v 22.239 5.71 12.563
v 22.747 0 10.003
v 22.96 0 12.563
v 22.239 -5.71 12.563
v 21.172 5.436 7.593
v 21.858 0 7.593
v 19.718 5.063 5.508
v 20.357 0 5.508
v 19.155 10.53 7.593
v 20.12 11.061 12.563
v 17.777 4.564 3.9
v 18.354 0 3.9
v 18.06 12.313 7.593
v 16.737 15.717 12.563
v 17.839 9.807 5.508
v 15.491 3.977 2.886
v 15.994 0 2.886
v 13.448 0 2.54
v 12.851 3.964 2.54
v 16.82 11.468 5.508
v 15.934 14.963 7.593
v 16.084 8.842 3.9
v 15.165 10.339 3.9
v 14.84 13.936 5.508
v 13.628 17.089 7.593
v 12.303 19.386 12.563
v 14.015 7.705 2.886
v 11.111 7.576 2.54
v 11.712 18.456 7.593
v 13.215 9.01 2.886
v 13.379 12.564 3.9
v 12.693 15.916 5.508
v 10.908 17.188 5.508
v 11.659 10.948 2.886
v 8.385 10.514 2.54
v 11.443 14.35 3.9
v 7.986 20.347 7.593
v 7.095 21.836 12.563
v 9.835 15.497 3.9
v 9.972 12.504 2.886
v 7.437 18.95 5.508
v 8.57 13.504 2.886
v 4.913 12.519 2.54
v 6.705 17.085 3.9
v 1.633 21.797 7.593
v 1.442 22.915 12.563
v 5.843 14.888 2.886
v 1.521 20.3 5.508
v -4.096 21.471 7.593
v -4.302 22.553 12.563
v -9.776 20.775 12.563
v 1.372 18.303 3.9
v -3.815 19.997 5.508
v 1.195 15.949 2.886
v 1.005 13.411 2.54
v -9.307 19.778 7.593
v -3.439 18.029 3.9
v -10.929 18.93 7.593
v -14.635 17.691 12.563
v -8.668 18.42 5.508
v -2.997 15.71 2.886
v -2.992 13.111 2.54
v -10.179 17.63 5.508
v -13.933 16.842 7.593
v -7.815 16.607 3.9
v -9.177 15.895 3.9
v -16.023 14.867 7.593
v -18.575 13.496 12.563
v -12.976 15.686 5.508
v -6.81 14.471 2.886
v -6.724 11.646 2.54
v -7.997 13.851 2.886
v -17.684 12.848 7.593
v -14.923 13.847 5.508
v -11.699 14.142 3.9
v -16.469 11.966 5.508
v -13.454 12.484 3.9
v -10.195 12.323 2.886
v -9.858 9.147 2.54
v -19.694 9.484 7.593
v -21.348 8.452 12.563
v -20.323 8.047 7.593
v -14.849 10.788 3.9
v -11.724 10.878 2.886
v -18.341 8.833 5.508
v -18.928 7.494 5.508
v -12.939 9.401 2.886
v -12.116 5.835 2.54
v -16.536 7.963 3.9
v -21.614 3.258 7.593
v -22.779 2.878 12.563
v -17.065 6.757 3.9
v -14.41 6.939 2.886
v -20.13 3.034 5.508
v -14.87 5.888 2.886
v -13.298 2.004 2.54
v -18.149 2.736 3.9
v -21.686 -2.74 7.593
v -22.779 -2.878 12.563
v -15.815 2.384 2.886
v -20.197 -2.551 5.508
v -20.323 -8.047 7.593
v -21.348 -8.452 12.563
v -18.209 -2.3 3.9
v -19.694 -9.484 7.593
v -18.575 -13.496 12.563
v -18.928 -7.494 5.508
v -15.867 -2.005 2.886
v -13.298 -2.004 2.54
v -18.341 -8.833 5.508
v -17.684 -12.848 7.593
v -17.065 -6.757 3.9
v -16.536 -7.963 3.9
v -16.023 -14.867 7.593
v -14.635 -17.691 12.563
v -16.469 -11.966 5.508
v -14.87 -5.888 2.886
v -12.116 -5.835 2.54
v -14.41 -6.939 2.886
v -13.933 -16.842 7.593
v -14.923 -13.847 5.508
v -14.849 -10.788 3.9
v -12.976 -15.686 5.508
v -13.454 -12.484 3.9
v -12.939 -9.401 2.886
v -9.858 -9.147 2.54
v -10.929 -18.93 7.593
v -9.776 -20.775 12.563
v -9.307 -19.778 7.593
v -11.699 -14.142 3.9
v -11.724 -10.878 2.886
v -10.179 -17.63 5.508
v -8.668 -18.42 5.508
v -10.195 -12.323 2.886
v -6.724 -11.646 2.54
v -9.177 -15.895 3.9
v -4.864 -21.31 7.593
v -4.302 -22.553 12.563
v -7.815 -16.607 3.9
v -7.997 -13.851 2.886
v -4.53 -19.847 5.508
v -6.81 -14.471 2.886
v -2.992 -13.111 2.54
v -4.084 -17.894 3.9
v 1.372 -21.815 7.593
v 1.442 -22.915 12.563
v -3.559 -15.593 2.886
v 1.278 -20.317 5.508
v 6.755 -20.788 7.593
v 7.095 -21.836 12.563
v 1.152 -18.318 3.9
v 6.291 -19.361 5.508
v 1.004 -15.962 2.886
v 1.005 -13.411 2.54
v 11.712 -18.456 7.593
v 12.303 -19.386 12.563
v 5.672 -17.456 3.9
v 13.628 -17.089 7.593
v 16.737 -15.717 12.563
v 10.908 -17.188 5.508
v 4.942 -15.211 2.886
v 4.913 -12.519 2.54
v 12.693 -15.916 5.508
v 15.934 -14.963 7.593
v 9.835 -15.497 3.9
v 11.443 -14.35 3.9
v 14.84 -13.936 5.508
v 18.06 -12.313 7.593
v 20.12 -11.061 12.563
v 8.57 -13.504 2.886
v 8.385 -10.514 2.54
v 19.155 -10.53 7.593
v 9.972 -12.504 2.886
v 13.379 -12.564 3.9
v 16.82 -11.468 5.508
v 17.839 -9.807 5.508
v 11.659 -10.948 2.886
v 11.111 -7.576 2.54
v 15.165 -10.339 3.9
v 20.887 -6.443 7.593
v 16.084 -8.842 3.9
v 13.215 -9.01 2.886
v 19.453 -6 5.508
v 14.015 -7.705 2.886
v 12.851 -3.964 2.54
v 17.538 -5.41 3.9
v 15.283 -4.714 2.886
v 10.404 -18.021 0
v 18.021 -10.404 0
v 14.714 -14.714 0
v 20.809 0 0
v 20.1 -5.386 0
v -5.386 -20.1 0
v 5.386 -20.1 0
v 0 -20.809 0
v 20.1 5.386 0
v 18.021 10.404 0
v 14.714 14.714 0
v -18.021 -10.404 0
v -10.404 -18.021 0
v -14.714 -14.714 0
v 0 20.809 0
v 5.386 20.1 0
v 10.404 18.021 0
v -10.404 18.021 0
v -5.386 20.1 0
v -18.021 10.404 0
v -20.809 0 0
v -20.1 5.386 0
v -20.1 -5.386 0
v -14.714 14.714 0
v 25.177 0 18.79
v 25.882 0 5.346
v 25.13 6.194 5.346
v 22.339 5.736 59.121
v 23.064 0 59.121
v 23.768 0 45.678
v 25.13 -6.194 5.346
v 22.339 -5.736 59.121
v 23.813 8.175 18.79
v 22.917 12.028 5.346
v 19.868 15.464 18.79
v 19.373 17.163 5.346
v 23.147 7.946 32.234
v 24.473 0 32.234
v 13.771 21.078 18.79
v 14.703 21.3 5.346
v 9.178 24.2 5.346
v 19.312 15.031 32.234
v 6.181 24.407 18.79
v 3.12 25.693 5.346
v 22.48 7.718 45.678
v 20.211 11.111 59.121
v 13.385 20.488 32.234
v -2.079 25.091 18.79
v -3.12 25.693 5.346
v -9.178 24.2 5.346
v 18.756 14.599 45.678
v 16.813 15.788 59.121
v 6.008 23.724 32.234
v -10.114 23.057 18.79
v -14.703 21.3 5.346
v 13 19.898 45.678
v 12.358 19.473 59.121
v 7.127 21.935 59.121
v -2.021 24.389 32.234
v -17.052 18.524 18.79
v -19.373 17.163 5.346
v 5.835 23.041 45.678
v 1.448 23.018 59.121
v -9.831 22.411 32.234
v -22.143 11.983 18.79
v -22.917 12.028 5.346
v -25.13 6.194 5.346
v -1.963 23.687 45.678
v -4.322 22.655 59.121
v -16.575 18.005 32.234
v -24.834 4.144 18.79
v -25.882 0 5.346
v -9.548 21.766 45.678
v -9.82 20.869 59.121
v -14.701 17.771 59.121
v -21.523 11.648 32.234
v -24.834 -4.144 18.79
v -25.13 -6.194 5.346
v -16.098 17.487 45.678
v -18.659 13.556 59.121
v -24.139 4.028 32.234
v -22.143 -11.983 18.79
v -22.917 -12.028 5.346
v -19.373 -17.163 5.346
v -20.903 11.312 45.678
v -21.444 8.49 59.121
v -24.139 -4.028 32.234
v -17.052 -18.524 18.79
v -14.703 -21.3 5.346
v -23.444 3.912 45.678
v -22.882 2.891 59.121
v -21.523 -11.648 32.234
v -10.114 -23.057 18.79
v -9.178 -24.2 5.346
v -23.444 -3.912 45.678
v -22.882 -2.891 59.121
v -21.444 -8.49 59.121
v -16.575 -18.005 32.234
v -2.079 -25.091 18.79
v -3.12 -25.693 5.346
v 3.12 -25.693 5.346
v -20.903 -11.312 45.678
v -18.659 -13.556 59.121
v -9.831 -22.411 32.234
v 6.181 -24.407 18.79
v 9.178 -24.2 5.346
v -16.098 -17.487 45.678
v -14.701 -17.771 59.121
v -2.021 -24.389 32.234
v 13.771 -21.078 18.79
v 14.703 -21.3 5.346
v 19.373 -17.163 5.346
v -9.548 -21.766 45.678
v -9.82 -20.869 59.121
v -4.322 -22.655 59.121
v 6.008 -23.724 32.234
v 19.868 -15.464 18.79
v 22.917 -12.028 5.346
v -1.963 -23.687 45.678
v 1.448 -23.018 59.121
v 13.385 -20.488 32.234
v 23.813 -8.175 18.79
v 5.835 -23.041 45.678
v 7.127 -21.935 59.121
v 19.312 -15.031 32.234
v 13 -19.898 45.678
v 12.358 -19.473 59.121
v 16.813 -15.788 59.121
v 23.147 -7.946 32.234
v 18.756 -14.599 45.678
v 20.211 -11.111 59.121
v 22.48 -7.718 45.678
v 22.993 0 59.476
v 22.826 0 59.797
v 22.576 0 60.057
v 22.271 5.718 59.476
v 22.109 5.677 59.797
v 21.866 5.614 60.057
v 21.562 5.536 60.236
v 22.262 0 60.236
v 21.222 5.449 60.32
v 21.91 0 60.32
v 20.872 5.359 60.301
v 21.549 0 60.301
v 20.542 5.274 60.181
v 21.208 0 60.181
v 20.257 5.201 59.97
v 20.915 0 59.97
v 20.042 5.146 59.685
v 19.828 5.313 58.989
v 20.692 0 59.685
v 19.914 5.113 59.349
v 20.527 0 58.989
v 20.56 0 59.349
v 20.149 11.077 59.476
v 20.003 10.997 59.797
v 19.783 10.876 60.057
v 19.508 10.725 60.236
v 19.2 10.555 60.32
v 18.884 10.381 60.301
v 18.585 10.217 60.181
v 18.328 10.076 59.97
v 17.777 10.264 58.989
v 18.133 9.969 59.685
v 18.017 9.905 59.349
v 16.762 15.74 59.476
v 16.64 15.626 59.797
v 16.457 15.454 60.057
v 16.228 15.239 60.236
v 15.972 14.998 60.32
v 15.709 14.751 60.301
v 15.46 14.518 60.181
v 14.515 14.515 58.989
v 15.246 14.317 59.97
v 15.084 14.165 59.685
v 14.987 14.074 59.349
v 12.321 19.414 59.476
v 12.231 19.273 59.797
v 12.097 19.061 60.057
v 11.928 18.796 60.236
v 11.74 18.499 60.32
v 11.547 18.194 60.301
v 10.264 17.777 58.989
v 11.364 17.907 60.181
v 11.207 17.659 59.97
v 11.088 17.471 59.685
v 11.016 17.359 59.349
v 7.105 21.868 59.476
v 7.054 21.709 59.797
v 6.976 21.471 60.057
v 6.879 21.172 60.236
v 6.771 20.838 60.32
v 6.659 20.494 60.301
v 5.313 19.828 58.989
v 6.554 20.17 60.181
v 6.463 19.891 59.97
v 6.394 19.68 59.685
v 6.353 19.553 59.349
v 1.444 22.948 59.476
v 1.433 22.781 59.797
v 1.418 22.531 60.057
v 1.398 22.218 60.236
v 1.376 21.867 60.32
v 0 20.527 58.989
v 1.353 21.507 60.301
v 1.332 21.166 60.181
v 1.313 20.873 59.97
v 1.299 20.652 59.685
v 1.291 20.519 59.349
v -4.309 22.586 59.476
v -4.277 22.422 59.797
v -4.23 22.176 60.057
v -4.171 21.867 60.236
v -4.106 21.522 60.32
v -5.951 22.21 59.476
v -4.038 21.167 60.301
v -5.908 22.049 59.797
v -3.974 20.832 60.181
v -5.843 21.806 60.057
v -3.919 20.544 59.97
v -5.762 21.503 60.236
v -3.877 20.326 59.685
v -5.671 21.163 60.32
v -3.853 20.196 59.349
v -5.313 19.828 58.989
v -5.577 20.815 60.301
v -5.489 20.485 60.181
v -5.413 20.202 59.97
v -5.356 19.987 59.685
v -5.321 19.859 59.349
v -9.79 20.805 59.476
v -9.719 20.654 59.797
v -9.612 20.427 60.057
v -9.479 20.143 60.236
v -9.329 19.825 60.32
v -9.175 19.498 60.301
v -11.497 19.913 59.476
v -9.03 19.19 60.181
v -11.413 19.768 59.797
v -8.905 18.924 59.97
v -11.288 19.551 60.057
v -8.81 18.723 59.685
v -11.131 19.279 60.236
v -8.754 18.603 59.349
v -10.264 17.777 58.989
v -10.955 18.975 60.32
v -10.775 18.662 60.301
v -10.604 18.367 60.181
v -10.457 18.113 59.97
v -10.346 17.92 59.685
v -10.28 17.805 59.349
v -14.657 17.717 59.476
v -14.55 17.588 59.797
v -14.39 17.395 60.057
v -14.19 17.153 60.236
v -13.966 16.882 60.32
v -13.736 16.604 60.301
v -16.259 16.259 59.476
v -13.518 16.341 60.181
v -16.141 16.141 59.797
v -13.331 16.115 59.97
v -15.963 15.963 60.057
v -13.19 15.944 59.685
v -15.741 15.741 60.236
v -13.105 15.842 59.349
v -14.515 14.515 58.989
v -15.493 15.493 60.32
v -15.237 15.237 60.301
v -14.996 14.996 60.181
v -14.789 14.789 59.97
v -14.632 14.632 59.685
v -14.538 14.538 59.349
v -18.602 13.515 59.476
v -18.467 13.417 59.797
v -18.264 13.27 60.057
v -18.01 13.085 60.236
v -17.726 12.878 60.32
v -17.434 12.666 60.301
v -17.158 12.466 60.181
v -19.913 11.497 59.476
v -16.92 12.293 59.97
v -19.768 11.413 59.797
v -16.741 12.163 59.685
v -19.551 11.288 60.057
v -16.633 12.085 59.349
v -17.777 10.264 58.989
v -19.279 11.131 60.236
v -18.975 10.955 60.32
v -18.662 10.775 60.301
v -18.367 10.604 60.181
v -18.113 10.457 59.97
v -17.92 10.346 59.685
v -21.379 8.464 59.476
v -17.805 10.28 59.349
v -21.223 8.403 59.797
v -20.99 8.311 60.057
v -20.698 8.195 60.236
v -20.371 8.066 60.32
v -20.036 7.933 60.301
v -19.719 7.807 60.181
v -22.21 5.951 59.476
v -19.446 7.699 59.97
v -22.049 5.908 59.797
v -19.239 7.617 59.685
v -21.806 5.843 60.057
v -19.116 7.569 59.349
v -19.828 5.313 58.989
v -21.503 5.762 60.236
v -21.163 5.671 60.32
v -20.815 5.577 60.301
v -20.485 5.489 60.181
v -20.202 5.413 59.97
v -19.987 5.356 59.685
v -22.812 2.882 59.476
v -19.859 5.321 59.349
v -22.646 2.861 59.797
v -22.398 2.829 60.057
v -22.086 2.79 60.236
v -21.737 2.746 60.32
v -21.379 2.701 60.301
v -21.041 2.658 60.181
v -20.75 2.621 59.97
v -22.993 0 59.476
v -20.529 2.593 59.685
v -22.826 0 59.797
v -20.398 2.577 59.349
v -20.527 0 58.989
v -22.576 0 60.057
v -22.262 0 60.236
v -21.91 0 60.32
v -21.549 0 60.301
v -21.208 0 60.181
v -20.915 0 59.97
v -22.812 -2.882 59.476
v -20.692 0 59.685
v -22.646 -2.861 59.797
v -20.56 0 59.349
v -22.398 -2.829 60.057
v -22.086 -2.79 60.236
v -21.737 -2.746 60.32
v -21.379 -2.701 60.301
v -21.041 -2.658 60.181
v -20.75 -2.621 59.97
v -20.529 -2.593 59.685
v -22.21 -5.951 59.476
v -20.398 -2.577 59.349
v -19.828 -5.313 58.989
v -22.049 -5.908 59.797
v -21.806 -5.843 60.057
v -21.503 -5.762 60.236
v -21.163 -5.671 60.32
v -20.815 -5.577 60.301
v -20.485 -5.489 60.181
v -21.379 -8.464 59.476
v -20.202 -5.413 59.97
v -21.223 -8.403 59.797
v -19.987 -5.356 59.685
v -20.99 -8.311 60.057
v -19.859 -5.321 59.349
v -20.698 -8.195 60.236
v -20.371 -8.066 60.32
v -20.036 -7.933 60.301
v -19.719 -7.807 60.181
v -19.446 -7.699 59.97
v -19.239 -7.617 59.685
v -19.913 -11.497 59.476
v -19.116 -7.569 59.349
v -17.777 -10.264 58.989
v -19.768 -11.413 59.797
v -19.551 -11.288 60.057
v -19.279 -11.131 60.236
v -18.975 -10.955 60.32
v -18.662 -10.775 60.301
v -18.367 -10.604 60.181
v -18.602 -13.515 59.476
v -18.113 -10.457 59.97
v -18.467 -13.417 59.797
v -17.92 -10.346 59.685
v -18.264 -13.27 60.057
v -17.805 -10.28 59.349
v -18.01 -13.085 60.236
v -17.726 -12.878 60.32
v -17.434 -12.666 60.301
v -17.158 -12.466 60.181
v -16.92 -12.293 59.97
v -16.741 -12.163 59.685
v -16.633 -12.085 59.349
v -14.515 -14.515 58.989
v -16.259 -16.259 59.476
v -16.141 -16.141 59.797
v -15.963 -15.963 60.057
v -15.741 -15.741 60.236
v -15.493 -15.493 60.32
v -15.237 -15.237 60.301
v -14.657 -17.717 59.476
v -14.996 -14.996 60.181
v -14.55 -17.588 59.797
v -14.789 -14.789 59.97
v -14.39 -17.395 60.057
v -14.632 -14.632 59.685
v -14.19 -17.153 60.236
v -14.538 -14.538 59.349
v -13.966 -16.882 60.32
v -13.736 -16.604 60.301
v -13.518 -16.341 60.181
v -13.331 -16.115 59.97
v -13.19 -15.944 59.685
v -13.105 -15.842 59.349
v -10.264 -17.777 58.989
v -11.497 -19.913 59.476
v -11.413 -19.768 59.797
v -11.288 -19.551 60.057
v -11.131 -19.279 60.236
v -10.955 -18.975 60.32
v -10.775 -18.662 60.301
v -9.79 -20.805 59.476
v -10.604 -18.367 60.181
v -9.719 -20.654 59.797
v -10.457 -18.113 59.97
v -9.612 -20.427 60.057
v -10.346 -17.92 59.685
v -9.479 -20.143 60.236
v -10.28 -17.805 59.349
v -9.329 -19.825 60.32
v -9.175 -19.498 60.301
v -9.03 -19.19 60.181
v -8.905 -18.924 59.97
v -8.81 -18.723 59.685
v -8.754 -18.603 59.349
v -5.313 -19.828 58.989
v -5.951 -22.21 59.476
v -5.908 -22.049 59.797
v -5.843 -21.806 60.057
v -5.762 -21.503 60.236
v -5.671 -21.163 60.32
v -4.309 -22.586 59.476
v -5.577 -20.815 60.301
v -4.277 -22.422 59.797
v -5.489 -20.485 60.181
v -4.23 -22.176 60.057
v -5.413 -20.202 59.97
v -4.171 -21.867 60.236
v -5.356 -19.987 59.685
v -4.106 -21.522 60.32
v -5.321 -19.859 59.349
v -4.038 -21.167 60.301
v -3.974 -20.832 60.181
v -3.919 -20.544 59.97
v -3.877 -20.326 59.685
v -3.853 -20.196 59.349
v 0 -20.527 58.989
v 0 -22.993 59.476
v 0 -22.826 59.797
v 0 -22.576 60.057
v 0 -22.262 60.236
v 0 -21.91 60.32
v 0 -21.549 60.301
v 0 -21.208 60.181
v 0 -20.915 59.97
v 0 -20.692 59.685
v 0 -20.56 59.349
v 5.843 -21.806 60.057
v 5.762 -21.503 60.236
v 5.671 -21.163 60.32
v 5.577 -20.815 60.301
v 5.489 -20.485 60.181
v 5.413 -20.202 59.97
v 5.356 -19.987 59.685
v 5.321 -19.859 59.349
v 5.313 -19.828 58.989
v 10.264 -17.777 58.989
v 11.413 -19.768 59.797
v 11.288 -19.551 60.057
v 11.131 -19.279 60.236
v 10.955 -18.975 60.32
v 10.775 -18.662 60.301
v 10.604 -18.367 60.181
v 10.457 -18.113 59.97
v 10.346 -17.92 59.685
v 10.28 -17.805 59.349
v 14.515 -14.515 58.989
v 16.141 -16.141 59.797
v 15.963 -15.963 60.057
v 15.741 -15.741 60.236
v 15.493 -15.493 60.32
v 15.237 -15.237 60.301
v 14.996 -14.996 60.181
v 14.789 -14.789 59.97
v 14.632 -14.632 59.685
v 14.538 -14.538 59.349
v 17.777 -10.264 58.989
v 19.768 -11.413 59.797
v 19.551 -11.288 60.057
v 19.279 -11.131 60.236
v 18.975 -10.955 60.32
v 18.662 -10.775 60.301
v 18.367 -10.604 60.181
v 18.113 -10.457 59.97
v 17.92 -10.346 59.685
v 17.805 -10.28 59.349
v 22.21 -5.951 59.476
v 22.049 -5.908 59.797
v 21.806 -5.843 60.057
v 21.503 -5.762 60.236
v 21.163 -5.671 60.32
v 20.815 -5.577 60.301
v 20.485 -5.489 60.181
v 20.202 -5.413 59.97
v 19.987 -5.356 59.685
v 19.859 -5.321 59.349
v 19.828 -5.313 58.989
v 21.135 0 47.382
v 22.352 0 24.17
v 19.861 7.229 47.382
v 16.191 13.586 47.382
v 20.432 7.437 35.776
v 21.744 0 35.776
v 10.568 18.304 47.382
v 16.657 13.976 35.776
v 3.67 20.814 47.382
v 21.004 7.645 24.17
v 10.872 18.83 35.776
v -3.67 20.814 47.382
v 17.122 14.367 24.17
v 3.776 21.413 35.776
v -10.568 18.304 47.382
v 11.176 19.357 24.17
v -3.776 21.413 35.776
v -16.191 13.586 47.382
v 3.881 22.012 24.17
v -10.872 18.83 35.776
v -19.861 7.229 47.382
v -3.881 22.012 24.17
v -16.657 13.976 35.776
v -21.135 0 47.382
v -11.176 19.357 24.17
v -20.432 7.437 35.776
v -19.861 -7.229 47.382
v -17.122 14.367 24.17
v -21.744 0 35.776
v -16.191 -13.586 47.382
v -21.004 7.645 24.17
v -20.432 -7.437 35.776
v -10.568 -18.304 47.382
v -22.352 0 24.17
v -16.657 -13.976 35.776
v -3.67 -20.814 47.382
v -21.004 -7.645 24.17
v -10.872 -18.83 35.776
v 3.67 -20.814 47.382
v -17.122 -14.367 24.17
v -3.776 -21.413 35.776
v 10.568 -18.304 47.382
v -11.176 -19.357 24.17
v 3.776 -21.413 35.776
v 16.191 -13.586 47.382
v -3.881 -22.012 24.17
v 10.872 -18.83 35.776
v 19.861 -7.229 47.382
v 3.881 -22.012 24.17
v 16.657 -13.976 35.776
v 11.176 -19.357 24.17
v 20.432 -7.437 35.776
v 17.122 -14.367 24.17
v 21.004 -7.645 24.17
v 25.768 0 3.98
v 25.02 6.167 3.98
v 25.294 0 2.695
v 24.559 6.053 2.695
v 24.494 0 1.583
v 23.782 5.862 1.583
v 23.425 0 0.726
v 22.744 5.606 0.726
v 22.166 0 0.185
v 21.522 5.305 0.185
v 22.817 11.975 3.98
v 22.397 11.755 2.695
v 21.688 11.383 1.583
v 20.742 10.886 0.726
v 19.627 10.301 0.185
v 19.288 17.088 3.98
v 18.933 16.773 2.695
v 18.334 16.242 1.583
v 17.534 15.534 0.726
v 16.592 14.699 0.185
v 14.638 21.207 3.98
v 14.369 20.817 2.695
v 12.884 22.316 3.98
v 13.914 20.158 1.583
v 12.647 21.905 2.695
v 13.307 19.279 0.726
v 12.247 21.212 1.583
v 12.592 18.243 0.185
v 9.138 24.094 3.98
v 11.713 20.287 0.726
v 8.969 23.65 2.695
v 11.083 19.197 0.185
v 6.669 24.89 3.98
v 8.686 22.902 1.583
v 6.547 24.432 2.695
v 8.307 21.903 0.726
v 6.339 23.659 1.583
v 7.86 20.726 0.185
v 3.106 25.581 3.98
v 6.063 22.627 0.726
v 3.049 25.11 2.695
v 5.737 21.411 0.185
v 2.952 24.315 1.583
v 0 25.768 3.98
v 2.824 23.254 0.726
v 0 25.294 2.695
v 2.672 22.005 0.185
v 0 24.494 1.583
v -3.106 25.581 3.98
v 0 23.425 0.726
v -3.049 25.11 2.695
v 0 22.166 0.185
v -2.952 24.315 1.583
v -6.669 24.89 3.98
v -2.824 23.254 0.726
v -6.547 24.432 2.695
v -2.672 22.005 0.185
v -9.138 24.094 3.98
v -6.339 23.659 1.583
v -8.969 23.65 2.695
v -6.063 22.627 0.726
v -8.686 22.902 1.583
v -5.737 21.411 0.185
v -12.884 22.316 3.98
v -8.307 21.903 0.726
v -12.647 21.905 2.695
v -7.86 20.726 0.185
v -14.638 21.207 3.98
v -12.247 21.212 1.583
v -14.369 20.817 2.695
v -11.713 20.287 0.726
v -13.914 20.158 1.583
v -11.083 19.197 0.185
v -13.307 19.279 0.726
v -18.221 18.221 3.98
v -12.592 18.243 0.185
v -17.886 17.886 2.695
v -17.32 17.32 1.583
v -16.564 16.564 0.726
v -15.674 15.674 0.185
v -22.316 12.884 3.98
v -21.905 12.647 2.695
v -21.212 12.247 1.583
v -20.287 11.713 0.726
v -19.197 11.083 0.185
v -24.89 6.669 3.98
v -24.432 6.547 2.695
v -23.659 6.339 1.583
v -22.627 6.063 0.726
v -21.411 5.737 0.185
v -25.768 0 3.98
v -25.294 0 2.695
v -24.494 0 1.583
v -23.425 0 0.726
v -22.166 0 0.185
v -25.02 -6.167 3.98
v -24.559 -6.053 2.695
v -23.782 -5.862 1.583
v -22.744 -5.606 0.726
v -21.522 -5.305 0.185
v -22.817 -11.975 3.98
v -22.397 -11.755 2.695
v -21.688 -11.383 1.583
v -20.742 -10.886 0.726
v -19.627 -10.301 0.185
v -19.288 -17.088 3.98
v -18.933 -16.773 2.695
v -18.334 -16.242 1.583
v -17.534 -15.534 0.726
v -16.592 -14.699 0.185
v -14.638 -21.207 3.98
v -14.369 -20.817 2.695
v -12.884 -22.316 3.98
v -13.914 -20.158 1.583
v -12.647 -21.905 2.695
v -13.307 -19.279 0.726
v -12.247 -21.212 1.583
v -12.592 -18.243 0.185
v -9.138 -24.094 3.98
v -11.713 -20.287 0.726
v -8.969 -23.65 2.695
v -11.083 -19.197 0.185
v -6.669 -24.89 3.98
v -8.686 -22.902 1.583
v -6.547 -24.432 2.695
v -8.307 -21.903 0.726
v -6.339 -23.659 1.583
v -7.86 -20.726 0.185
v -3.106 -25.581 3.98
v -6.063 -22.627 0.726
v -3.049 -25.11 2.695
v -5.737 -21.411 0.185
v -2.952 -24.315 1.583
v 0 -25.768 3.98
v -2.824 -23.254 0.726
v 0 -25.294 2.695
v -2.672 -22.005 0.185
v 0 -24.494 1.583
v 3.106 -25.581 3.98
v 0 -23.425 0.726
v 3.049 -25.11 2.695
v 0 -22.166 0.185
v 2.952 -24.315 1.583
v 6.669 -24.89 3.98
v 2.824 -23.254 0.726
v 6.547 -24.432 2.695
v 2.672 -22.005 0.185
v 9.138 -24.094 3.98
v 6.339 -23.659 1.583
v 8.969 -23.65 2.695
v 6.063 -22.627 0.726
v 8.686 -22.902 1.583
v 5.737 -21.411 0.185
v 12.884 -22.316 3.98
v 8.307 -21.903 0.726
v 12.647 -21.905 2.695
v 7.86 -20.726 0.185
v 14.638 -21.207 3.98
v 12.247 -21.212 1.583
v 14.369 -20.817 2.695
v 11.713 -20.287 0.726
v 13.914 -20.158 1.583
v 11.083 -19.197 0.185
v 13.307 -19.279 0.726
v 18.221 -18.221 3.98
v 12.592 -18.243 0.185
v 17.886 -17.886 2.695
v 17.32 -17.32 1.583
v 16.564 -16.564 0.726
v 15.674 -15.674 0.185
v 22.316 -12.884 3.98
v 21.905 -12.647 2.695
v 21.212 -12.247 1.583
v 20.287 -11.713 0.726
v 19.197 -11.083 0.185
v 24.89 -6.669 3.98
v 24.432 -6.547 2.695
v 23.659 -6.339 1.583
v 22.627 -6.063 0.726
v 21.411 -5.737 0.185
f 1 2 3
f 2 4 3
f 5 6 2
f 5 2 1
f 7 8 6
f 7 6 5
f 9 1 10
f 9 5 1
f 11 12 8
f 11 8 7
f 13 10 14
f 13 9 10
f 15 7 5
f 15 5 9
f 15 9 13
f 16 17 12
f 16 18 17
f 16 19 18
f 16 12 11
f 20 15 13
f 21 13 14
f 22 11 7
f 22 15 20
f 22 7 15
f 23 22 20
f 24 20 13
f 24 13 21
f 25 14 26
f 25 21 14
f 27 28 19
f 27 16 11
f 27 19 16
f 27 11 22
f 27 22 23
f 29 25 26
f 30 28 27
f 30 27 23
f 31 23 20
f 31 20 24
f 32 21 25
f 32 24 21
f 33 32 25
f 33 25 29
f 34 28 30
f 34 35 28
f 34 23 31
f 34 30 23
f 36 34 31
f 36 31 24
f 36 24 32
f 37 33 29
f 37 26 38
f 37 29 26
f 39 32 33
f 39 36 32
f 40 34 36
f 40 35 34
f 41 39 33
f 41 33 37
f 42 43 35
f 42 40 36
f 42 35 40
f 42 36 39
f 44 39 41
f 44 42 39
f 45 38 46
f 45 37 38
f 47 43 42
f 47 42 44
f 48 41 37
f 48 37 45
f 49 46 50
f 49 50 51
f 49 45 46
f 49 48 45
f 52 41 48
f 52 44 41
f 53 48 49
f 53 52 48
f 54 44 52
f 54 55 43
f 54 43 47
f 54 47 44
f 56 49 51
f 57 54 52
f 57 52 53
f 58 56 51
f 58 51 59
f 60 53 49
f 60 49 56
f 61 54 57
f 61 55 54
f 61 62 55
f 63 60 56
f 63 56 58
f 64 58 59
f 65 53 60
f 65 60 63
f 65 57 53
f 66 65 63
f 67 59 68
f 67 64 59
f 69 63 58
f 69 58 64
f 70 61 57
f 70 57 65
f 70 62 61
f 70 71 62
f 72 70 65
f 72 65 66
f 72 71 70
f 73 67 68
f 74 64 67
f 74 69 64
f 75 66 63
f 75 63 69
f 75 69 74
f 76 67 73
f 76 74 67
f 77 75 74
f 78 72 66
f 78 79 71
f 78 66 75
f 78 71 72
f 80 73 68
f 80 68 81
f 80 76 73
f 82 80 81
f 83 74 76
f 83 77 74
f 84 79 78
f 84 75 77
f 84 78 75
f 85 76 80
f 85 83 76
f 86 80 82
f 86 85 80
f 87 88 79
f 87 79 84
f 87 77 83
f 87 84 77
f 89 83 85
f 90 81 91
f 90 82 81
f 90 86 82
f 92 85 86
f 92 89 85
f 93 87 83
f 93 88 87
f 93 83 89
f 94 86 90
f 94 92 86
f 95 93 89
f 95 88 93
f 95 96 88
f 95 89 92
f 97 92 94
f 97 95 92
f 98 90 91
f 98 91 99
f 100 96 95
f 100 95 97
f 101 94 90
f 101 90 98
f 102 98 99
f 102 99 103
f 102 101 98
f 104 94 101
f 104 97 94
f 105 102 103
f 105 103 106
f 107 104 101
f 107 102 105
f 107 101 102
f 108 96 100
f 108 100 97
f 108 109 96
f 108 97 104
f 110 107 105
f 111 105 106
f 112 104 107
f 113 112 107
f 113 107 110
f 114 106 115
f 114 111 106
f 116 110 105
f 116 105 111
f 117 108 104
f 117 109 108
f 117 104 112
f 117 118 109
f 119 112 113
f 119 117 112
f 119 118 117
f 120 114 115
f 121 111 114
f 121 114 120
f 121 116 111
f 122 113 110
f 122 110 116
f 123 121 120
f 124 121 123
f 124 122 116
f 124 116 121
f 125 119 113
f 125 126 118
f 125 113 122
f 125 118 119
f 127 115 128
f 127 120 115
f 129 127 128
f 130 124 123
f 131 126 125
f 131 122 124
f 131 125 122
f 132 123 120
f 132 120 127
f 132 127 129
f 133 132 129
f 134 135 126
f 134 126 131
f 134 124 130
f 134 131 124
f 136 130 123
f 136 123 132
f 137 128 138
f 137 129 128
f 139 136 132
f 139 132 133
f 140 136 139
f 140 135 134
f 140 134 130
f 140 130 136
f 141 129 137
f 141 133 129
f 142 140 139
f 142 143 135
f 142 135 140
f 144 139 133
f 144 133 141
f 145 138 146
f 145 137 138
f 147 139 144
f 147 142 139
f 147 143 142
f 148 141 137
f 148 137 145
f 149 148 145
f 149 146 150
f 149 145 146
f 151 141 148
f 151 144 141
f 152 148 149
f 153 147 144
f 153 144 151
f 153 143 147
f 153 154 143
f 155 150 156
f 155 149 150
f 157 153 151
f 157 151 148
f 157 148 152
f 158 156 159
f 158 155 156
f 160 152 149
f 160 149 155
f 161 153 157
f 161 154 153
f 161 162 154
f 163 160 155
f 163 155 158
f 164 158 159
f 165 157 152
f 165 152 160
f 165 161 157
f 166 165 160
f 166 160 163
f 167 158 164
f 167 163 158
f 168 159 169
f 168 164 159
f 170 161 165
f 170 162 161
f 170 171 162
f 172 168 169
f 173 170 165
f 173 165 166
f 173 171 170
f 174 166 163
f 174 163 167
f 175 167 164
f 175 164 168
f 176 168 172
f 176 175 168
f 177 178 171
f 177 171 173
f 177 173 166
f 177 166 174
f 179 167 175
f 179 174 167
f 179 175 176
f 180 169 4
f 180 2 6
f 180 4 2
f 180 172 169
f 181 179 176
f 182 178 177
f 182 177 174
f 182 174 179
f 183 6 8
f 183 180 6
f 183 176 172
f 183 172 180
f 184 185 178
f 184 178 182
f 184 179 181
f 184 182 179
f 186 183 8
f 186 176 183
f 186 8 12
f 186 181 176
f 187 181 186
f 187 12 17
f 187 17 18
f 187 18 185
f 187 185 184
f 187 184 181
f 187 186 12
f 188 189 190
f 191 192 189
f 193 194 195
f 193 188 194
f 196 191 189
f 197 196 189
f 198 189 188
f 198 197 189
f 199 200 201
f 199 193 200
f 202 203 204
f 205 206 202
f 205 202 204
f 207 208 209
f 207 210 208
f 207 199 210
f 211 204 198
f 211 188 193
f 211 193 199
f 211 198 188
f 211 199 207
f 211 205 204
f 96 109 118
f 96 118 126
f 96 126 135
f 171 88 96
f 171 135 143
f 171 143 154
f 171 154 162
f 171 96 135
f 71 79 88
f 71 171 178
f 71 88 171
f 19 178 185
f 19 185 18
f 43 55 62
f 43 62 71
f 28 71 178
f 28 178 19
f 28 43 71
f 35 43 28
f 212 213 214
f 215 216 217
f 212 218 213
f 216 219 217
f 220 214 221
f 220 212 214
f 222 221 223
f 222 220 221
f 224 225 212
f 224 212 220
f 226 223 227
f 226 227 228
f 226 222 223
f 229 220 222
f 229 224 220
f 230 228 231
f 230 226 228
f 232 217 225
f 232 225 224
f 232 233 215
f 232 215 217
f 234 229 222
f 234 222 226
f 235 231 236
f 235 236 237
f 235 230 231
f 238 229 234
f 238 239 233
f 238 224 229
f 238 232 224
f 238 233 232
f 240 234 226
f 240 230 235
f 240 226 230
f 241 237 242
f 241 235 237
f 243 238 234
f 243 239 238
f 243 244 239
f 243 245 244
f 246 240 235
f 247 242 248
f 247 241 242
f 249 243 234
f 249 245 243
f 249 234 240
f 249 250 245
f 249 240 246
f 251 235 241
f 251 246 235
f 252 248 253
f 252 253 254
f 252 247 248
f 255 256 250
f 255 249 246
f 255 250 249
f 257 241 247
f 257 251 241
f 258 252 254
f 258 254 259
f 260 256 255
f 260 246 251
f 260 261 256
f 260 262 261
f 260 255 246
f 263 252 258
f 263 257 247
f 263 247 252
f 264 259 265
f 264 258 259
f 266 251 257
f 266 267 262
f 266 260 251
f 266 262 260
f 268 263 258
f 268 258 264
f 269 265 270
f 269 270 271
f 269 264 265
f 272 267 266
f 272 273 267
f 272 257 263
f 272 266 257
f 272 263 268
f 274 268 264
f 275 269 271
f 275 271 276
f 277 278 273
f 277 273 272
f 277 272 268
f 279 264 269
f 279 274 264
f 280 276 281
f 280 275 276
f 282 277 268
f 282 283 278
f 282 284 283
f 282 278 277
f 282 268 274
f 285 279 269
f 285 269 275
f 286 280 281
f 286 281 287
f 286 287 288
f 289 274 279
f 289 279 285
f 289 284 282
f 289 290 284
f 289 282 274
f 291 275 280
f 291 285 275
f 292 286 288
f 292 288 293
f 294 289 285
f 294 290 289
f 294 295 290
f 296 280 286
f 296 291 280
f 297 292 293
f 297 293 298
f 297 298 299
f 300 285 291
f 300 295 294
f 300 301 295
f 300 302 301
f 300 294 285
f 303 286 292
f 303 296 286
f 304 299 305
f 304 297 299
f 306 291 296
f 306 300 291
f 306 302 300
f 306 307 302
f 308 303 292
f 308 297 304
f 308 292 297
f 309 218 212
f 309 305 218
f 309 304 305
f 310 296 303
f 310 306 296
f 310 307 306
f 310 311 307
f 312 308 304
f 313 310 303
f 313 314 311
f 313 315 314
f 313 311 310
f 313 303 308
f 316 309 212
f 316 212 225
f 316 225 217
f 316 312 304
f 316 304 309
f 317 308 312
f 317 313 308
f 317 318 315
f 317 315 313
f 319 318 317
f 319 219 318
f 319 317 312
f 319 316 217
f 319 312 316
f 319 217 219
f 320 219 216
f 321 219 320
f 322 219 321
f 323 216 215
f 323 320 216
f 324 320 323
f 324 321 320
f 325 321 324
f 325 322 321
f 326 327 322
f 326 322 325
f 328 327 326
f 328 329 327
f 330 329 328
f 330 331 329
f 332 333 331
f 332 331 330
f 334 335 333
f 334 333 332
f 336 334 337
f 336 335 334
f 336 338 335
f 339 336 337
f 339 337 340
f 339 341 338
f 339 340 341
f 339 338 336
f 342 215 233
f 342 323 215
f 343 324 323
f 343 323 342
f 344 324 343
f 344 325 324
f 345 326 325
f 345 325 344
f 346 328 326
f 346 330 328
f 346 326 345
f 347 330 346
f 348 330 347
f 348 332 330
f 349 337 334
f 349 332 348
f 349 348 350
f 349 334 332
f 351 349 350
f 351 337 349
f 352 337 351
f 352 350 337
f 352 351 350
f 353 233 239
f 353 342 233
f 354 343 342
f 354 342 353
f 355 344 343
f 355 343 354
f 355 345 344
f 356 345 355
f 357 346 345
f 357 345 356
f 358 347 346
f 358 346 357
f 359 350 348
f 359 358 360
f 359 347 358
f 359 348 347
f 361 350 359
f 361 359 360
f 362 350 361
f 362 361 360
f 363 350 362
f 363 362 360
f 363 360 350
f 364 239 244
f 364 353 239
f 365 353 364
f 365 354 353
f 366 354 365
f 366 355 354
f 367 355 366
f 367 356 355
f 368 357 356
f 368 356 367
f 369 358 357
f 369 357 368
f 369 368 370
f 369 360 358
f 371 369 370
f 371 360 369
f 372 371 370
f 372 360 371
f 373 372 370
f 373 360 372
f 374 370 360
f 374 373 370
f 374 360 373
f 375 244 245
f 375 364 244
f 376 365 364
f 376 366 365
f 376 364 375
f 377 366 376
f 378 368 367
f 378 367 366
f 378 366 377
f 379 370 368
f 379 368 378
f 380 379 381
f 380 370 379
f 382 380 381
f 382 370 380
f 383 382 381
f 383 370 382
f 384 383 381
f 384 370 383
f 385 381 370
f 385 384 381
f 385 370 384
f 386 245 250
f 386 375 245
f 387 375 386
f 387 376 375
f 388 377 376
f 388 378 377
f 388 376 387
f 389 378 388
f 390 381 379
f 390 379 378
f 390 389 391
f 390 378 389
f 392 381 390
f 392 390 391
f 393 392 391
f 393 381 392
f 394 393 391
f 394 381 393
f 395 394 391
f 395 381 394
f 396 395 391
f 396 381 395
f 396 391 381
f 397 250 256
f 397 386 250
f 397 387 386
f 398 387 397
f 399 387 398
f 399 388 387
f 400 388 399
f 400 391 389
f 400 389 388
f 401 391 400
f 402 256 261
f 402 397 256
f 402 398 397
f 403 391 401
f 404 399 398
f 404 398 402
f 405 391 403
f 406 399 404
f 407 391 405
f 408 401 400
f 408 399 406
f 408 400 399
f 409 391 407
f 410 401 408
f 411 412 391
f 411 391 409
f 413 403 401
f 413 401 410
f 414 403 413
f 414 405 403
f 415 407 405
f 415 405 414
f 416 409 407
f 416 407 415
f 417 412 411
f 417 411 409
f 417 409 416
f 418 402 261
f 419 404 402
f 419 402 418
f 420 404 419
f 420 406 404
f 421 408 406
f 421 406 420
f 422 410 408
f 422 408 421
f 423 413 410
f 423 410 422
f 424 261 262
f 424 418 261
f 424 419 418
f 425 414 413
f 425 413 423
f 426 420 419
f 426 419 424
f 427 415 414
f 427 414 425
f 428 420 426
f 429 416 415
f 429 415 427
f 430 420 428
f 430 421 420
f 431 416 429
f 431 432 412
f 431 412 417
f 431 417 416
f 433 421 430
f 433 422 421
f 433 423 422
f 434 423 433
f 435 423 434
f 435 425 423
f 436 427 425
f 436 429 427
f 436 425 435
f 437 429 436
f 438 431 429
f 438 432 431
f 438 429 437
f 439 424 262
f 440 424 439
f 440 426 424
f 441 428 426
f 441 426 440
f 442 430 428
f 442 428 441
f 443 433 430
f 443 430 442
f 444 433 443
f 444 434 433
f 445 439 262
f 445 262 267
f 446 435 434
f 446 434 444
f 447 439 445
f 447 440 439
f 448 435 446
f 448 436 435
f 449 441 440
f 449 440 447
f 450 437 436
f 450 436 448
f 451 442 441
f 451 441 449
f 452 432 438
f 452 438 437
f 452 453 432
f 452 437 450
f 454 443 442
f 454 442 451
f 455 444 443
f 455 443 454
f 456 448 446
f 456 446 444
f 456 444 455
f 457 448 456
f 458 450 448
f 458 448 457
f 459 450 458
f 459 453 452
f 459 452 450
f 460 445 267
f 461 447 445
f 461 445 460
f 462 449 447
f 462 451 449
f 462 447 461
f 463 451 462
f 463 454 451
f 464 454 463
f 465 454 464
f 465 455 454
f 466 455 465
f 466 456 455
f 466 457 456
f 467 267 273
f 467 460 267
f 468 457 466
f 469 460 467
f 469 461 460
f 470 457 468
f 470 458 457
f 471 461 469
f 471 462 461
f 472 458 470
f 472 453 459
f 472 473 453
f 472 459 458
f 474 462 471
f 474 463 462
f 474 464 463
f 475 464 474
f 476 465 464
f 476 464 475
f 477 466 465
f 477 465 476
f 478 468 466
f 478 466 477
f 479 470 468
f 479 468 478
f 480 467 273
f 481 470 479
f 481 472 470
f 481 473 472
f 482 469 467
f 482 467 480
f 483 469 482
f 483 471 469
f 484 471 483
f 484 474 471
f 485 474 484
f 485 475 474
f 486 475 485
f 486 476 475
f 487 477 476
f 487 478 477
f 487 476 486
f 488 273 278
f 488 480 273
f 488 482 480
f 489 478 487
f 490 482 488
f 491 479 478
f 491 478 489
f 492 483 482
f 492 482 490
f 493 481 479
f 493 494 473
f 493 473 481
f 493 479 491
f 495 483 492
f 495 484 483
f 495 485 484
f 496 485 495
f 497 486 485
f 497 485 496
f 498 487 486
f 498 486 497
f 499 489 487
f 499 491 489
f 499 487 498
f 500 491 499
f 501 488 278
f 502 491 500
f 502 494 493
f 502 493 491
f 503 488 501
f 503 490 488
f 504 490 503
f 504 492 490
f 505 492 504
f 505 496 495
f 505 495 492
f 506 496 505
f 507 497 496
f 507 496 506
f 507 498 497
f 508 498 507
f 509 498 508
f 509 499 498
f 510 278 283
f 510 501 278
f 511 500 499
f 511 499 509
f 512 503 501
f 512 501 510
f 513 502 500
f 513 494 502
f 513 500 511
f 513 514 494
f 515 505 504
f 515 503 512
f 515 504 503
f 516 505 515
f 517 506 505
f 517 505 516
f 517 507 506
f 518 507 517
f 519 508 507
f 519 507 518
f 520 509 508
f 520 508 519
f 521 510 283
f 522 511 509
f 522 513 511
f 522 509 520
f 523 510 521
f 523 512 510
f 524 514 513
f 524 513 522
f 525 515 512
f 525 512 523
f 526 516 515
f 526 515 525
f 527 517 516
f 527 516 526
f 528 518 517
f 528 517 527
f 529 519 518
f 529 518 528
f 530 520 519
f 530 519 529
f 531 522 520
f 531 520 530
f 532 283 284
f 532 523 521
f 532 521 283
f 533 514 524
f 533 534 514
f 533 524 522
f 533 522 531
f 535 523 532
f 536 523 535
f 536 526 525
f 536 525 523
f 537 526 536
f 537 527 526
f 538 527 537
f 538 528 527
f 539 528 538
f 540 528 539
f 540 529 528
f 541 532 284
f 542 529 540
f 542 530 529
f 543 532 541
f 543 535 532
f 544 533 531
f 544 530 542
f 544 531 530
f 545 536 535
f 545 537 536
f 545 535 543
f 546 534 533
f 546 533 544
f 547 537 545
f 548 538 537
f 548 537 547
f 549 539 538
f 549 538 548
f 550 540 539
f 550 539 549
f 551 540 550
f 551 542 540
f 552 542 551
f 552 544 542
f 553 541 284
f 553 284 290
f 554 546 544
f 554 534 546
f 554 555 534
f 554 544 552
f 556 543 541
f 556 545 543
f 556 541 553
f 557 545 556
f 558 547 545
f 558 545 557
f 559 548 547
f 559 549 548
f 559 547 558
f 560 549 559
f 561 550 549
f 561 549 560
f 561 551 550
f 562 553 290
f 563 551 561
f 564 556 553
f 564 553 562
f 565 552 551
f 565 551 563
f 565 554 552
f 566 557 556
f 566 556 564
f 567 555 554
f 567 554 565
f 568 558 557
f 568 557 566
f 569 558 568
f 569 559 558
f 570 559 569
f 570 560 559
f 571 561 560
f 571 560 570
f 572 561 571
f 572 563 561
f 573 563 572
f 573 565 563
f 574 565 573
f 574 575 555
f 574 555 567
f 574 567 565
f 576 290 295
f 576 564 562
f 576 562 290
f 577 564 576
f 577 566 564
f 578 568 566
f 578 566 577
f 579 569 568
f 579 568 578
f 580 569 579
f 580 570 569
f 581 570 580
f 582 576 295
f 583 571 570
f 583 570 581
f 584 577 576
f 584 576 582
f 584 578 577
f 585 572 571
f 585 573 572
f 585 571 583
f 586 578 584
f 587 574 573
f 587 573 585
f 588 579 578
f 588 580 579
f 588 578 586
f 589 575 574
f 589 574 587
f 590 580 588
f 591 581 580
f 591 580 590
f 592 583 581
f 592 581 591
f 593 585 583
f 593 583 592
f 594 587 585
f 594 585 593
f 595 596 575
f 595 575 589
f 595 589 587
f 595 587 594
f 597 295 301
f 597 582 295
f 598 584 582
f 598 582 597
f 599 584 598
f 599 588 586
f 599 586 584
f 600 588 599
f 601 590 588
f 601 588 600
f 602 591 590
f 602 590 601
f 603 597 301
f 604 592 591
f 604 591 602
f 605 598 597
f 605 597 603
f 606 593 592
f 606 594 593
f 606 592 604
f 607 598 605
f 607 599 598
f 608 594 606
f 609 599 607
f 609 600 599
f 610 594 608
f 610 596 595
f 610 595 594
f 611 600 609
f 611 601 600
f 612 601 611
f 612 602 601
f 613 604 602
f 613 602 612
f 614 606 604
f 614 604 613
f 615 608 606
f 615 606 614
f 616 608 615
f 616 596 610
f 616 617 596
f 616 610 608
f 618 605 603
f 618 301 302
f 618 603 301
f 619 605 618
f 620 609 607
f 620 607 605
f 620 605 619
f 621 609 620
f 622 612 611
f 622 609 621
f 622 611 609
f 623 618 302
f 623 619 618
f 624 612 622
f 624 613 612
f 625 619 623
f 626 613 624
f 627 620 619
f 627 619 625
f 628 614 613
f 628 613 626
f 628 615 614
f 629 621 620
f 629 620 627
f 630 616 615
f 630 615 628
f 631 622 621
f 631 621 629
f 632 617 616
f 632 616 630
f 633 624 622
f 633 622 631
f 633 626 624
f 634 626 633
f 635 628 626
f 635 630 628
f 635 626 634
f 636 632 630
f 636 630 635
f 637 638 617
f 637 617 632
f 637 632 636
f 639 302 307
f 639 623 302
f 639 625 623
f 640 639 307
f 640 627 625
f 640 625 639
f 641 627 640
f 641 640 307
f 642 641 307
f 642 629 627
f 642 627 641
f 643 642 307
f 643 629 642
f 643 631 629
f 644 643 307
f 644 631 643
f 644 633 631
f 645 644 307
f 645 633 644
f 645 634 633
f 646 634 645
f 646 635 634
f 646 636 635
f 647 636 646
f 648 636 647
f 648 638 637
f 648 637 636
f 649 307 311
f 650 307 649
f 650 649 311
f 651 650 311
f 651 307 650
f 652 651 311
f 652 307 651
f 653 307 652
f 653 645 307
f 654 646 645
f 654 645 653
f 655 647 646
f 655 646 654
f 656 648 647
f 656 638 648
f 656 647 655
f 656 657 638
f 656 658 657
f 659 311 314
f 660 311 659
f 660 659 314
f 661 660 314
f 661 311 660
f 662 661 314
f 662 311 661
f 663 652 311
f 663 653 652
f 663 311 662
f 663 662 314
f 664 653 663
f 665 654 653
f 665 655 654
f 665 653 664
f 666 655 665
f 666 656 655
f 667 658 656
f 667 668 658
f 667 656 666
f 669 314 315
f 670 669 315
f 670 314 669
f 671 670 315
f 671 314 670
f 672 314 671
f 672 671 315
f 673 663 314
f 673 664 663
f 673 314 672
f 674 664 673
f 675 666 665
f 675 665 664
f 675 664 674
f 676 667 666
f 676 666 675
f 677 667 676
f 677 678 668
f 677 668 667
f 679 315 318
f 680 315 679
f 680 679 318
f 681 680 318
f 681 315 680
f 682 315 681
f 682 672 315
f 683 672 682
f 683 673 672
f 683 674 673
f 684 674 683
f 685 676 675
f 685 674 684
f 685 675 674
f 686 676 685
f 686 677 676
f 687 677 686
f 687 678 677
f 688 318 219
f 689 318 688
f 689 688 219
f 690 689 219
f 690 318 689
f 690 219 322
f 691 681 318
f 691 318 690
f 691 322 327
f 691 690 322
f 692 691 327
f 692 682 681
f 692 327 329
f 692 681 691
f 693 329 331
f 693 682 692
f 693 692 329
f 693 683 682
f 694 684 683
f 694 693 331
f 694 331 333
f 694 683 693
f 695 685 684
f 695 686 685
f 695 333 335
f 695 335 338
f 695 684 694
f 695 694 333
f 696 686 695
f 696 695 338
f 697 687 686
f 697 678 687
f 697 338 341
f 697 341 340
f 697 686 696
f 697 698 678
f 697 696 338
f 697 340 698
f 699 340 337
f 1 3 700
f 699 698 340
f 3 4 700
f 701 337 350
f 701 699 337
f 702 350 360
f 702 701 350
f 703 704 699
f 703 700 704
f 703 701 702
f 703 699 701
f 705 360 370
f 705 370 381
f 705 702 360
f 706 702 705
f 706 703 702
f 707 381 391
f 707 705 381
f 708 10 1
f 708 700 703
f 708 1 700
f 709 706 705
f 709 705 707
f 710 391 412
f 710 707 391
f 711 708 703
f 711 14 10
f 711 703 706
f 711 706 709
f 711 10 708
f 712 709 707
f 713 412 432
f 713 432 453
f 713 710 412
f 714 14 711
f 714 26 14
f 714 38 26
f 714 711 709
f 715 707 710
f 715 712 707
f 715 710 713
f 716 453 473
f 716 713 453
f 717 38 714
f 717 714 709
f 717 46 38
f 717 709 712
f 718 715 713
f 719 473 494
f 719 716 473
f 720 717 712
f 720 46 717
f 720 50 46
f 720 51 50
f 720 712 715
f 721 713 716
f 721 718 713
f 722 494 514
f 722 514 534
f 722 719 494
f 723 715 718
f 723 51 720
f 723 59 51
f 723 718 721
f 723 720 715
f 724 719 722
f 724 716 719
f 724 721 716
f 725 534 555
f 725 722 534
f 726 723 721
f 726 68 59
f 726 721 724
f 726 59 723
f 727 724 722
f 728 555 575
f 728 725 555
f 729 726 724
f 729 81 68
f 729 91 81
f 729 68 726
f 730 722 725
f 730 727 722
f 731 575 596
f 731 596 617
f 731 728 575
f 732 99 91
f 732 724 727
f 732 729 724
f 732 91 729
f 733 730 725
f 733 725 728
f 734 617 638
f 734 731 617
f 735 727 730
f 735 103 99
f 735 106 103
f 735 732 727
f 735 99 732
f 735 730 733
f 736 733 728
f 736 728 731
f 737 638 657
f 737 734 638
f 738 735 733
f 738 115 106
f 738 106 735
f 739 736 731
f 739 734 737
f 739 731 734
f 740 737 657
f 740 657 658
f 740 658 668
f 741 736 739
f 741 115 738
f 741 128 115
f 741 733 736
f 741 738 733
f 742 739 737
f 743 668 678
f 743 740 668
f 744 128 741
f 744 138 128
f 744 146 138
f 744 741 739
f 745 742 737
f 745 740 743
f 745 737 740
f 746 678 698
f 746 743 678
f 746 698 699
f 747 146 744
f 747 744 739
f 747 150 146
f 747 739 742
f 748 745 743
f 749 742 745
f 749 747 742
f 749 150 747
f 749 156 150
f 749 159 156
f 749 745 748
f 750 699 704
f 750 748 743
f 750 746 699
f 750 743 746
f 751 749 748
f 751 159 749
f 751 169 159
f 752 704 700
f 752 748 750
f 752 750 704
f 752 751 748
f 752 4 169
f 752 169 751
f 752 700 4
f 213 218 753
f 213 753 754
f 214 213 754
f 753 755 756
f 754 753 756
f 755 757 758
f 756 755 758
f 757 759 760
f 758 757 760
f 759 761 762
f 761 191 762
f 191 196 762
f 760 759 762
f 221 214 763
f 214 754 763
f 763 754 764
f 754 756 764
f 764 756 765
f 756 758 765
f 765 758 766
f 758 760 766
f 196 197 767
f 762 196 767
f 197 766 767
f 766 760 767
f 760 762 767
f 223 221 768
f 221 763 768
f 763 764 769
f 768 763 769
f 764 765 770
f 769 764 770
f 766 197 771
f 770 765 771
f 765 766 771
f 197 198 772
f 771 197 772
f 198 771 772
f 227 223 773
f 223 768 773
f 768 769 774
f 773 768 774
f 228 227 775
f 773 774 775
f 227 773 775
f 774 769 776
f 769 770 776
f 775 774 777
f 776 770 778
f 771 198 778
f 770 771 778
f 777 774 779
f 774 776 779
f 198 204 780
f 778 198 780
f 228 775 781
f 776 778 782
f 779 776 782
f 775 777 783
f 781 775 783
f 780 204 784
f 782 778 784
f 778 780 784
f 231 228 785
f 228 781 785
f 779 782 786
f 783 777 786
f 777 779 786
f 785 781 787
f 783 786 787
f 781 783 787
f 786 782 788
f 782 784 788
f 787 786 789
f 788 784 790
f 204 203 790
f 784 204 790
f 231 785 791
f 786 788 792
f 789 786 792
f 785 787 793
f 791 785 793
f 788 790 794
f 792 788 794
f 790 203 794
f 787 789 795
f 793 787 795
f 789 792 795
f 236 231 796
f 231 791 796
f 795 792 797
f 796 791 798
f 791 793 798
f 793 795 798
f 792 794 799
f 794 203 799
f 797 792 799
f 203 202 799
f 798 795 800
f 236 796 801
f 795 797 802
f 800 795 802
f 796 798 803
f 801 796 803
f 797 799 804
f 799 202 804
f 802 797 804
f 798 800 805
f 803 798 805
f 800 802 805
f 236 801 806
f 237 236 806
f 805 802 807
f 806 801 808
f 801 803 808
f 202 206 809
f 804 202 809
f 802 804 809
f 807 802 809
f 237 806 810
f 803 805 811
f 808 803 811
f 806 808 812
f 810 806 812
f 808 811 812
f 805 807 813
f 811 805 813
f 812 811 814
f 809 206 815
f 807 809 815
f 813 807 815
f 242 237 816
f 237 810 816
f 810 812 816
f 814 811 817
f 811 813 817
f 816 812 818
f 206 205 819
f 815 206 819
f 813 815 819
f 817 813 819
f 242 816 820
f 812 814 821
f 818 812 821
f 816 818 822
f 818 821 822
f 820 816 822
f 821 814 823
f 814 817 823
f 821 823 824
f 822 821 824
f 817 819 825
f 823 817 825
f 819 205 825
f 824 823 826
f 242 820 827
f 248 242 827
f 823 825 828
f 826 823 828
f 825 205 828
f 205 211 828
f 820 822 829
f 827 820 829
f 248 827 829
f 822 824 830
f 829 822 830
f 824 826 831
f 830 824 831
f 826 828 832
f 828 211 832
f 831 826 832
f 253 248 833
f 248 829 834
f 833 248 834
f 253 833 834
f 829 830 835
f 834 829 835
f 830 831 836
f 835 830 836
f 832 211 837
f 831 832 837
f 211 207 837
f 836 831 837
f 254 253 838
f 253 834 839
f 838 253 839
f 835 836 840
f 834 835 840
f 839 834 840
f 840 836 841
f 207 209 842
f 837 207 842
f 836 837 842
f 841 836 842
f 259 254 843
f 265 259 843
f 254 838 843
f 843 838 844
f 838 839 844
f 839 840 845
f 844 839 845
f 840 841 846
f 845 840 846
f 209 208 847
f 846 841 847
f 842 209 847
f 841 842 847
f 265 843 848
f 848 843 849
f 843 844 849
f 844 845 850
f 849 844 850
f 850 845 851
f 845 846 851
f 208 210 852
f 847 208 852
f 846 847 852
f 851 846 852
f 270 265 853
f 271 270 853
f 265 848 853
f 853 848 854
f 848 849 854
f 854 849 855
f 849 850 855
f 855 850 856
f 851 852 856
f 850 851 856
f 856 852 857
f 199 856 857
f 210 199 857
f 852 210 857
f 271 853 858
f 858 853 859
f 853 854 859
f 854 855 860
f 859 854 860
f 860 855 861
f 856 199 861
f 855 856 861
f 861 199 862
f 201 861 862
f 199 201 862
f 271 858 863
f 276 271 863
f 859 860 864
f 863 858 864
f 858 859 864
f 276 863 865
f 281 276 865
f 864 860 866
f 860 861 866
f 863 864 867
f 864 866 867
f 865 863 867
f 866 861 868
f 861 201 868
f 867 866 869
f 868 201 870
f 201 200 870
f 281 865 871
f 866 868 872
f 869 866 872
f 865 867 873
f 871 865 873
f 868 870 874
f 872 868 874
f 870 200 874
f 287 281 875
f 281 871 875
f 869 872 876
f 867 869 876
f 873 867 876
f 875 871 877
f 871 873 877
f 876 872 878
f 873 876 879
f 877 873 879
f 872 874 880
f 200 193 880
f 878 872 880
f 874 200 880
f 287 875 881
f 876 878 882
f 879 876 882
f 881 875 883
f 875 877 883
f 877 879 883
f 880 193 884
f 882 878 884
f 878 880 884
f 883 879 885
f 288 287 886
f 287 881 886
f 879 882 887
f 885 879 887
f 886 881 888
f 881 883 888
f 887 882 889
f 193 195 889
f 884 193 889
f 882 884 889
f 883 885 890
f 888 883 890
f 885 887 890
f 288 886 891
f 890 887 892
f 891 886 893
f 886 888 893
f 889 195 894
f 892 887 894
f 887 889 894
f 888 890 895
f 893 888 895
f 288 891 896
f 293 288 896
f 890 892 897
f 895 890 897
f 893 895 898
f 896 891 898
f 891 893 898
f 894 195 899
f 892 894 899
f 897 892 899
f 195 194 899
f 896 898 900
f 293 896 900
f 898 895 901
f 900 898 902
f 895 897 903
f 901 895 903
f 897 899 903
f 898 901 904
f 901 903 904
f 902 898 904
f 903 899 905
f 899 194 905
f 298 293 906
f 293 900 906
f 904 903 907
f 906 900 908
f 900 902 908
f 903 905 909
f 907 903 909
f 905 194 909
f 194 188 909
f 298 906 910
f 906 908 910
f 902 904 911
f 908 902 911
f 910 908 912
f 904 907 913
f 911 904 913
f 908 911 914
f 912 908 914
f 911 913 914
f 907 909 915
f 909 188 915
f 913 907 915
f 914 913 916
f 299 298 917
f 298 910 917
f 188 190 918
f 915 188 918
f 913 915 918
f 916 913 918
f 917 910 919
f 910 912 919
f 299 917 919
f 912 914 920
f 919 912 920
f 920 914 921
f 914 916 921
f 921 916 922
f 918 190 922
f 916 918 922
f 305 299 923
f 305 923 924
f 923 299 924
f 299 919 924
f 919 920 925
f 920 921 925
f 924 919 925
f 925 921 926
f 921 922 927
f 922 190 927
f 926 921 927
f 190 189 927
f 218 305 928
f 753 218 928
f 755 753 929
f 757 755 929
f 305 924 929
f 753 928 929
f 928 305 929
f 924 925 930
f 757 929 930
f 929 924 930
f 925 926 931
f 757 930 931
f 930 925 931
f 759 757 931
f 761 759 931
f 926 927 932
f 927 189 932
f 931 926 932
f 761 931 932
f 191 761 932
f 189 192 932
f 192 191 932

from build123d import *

# Parameters (mm, degrees)
F2_R = 9.525
F3_R = 5.08


with BuildPart() as f1:
    # F0 (on Front) → F1 (revolve)
    with BuildSketch(Plane.XZ):
        with BuildLine():
            Line((0, 2.54), (0, 0))
            Line((0, 0), (26.162, 0))
            Line((26.162, 0), (23.063575, 59.121467))
            ThreePointArc((23.063575, 59.121467), (21.728849, 60.32326), (20.527056, 58.988533))
            Line((20.527056, 58.988533), (23.485398, 2.54))
            Line((23.485398, 2.54), (0, 2.54))
        make_face()
    revolve(axis=Axis((0, 0, 30.1625), (0, 0, 1)))

    # F2
    f2_edges = [f1.edges().sort_by_distance(p)[0] for p in [
        (-23.485398, 0, 2.54),
    ]]
    fillet(f2_edges, radius=F2_R)

    # F3
    f3_edges = [f1.edges().sort_by_distance(p)[0] for p in [
        (-26.162, 0, 0),
    ]]
    fillet(f3_edges, radius=F3_R)


solid = f1.part
